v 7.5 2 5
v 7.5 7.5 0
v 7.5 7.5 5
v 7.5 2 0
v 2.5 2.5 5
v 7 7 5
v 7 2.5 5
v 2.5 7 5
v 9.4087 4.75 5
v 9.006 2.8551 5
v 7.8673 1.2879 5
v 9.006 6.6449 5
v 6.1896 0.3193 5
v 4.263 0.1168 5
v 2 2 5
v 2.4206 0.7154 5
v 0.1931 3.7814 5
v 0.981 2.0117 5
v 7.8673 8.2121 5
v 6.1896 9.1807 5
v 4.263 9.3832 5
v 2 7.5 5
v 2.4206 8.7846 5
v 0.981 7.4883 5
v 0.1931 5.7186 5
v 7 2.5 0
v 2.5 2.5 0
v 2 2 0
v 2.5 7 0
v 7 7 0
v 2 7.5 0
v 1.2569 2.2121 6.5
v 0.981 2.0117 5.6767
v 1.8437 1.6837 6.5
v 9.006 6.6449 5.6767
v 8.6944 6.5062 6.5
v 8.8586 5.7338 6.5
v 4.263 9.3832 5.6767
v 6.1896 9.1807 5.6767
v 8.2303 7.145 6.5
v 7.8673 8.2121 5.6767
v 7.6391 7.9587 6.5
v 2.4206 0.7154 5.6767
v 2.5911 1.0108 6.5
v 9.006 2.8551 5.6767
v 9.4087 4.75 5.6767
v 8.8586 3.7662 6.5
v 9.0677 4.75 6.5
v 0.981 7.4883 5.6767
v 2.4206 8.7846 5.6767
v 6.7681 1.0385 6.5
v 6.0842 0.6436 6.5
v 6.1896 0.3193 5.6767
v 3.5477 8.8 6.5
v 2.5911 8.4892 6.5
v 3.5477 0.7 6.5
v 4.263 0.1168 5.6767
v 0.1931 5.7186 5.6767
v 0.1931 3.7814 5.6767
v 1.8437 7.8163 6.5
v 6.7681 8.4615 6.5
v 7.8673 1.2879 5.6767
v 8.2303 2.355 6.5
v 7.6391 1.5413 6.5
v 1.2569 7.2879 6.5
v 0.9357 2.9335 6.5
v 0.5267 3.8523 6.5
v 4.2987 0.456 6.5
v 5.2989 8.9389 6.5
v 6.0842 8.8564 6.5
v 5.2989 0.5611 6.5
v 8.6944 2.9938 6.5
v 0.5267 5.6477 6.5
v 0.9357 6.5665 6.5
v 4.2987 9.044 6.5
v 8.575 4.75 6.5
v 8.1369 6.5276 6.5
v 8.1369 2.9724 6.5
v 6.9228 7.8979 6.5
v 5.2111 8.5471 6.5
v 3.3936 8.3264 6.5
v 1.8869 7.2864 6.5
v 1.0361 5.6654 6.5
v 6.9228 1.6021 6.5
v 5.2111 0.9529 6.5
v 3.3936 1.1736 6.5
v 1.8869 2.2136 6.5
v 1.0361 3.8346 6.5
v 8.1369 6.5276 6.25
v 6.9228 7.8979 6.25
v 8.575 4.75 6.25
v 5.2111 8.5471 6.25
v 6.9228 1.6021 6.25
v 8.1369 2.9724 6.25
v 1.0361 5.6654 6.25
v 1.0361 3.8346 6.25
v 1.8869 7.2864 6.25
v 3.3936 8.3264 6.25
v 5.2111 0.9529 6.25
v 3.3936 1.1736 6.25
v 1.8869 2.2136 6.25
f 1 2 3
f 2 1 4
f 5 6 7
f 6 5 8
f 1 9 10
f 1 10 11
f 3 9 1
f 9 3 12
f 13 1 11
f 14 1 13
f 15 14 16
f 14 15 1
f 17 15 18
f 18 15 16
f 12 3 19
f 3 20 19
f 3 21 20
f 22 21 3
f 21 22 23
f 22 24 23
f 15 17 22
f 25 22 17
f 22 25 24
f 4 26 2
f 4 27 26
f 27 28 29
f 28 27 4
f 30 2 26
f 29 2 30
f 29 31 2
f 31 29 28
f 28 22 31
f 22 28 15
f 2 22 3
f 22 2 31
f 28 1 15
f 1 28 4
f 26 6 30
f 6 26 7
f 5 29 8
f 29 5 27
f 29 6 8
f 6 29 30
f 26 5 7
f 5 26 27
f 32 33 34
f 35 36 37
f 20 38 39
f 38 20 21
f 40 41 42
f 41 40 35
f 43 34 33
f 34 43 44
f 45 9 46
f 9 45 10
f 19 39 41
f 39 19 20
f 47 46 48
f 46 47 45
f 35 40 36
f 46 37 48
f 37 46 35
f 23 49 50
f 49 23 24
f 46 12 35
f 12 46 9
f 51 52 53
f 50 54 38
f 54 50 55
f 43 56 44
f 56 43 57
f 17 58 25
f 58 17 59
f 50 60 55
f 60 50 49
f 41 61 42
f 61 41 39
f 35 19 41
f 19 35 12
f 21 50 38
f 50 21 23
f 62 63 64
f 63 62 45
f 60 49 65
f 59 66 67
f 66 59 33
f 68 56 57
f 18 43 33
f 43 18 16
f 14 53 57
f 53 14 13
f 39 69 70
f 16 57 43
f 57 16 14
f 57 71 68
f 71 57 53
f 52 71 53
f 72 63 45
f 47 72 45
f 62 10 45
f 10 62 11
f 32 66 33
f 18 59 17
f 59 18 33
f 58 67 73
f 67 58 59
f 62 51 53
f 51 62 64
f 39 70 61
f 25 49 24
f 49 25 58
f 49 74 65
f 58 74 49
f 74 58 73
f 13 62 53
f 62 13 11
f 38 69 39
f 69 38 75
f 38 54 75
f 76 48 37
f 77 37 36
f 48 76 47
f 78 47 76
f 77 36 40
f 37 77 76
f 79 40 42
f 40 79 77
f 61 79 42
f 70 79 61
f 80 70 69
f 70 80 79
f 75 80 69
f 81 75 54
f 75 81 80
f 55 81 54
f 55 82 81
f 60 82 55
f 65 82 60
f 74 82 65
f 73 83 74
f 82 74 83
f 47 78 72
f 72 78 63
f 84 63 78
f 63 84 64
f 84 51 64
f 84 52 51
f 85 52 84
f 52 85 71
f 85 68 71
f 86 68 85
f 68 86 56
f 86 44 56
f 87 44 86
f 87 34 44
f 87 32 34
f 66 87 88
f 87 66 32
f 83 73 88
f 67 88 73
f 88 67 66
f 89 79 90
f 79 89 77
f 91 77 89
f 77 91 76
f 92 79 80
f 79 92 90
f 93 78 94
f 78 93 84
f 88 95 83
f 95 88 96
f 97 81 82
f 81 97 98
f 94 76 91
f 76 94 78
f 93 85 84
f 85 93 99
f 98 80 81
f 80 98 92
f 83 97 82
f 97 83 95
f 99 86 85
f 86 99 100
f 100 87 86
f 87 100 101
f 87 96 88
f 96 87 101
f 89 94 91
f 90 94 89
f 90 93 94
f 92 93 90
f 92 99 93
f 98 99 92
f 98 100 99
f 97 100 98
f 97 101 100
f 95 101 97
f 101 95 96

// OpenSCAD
bottom_r= 4.5;
socket_area= 4.5;
//1.5 mm high nub
nub_r= 9.5/2;
nub_h_cut= 9.5-1.5/2;
grip_h= .25;
difference(){
translate([2,2,0])
cube([5.5,5.5,5]);
translate([nub_r-socket_area/2,nub_r-socket_area/2,0])
cube([4.5,4.5,5]);
}
difference(){
translate([nub_r, nub_r,nub_r])
sphere(9.5/2);
cube([bottom_r*2+1,bottom_r*2+1,5]);
translate([0,0,5+1.5])
cube(nub_r*2);
translate([nub_r,nub_r,5+1.5-.25])
cylinder(.25,bottom_r*.85,bottom_r*.85);
}
//grip at .25mm height,ensure that the grip is within the height of the nub
